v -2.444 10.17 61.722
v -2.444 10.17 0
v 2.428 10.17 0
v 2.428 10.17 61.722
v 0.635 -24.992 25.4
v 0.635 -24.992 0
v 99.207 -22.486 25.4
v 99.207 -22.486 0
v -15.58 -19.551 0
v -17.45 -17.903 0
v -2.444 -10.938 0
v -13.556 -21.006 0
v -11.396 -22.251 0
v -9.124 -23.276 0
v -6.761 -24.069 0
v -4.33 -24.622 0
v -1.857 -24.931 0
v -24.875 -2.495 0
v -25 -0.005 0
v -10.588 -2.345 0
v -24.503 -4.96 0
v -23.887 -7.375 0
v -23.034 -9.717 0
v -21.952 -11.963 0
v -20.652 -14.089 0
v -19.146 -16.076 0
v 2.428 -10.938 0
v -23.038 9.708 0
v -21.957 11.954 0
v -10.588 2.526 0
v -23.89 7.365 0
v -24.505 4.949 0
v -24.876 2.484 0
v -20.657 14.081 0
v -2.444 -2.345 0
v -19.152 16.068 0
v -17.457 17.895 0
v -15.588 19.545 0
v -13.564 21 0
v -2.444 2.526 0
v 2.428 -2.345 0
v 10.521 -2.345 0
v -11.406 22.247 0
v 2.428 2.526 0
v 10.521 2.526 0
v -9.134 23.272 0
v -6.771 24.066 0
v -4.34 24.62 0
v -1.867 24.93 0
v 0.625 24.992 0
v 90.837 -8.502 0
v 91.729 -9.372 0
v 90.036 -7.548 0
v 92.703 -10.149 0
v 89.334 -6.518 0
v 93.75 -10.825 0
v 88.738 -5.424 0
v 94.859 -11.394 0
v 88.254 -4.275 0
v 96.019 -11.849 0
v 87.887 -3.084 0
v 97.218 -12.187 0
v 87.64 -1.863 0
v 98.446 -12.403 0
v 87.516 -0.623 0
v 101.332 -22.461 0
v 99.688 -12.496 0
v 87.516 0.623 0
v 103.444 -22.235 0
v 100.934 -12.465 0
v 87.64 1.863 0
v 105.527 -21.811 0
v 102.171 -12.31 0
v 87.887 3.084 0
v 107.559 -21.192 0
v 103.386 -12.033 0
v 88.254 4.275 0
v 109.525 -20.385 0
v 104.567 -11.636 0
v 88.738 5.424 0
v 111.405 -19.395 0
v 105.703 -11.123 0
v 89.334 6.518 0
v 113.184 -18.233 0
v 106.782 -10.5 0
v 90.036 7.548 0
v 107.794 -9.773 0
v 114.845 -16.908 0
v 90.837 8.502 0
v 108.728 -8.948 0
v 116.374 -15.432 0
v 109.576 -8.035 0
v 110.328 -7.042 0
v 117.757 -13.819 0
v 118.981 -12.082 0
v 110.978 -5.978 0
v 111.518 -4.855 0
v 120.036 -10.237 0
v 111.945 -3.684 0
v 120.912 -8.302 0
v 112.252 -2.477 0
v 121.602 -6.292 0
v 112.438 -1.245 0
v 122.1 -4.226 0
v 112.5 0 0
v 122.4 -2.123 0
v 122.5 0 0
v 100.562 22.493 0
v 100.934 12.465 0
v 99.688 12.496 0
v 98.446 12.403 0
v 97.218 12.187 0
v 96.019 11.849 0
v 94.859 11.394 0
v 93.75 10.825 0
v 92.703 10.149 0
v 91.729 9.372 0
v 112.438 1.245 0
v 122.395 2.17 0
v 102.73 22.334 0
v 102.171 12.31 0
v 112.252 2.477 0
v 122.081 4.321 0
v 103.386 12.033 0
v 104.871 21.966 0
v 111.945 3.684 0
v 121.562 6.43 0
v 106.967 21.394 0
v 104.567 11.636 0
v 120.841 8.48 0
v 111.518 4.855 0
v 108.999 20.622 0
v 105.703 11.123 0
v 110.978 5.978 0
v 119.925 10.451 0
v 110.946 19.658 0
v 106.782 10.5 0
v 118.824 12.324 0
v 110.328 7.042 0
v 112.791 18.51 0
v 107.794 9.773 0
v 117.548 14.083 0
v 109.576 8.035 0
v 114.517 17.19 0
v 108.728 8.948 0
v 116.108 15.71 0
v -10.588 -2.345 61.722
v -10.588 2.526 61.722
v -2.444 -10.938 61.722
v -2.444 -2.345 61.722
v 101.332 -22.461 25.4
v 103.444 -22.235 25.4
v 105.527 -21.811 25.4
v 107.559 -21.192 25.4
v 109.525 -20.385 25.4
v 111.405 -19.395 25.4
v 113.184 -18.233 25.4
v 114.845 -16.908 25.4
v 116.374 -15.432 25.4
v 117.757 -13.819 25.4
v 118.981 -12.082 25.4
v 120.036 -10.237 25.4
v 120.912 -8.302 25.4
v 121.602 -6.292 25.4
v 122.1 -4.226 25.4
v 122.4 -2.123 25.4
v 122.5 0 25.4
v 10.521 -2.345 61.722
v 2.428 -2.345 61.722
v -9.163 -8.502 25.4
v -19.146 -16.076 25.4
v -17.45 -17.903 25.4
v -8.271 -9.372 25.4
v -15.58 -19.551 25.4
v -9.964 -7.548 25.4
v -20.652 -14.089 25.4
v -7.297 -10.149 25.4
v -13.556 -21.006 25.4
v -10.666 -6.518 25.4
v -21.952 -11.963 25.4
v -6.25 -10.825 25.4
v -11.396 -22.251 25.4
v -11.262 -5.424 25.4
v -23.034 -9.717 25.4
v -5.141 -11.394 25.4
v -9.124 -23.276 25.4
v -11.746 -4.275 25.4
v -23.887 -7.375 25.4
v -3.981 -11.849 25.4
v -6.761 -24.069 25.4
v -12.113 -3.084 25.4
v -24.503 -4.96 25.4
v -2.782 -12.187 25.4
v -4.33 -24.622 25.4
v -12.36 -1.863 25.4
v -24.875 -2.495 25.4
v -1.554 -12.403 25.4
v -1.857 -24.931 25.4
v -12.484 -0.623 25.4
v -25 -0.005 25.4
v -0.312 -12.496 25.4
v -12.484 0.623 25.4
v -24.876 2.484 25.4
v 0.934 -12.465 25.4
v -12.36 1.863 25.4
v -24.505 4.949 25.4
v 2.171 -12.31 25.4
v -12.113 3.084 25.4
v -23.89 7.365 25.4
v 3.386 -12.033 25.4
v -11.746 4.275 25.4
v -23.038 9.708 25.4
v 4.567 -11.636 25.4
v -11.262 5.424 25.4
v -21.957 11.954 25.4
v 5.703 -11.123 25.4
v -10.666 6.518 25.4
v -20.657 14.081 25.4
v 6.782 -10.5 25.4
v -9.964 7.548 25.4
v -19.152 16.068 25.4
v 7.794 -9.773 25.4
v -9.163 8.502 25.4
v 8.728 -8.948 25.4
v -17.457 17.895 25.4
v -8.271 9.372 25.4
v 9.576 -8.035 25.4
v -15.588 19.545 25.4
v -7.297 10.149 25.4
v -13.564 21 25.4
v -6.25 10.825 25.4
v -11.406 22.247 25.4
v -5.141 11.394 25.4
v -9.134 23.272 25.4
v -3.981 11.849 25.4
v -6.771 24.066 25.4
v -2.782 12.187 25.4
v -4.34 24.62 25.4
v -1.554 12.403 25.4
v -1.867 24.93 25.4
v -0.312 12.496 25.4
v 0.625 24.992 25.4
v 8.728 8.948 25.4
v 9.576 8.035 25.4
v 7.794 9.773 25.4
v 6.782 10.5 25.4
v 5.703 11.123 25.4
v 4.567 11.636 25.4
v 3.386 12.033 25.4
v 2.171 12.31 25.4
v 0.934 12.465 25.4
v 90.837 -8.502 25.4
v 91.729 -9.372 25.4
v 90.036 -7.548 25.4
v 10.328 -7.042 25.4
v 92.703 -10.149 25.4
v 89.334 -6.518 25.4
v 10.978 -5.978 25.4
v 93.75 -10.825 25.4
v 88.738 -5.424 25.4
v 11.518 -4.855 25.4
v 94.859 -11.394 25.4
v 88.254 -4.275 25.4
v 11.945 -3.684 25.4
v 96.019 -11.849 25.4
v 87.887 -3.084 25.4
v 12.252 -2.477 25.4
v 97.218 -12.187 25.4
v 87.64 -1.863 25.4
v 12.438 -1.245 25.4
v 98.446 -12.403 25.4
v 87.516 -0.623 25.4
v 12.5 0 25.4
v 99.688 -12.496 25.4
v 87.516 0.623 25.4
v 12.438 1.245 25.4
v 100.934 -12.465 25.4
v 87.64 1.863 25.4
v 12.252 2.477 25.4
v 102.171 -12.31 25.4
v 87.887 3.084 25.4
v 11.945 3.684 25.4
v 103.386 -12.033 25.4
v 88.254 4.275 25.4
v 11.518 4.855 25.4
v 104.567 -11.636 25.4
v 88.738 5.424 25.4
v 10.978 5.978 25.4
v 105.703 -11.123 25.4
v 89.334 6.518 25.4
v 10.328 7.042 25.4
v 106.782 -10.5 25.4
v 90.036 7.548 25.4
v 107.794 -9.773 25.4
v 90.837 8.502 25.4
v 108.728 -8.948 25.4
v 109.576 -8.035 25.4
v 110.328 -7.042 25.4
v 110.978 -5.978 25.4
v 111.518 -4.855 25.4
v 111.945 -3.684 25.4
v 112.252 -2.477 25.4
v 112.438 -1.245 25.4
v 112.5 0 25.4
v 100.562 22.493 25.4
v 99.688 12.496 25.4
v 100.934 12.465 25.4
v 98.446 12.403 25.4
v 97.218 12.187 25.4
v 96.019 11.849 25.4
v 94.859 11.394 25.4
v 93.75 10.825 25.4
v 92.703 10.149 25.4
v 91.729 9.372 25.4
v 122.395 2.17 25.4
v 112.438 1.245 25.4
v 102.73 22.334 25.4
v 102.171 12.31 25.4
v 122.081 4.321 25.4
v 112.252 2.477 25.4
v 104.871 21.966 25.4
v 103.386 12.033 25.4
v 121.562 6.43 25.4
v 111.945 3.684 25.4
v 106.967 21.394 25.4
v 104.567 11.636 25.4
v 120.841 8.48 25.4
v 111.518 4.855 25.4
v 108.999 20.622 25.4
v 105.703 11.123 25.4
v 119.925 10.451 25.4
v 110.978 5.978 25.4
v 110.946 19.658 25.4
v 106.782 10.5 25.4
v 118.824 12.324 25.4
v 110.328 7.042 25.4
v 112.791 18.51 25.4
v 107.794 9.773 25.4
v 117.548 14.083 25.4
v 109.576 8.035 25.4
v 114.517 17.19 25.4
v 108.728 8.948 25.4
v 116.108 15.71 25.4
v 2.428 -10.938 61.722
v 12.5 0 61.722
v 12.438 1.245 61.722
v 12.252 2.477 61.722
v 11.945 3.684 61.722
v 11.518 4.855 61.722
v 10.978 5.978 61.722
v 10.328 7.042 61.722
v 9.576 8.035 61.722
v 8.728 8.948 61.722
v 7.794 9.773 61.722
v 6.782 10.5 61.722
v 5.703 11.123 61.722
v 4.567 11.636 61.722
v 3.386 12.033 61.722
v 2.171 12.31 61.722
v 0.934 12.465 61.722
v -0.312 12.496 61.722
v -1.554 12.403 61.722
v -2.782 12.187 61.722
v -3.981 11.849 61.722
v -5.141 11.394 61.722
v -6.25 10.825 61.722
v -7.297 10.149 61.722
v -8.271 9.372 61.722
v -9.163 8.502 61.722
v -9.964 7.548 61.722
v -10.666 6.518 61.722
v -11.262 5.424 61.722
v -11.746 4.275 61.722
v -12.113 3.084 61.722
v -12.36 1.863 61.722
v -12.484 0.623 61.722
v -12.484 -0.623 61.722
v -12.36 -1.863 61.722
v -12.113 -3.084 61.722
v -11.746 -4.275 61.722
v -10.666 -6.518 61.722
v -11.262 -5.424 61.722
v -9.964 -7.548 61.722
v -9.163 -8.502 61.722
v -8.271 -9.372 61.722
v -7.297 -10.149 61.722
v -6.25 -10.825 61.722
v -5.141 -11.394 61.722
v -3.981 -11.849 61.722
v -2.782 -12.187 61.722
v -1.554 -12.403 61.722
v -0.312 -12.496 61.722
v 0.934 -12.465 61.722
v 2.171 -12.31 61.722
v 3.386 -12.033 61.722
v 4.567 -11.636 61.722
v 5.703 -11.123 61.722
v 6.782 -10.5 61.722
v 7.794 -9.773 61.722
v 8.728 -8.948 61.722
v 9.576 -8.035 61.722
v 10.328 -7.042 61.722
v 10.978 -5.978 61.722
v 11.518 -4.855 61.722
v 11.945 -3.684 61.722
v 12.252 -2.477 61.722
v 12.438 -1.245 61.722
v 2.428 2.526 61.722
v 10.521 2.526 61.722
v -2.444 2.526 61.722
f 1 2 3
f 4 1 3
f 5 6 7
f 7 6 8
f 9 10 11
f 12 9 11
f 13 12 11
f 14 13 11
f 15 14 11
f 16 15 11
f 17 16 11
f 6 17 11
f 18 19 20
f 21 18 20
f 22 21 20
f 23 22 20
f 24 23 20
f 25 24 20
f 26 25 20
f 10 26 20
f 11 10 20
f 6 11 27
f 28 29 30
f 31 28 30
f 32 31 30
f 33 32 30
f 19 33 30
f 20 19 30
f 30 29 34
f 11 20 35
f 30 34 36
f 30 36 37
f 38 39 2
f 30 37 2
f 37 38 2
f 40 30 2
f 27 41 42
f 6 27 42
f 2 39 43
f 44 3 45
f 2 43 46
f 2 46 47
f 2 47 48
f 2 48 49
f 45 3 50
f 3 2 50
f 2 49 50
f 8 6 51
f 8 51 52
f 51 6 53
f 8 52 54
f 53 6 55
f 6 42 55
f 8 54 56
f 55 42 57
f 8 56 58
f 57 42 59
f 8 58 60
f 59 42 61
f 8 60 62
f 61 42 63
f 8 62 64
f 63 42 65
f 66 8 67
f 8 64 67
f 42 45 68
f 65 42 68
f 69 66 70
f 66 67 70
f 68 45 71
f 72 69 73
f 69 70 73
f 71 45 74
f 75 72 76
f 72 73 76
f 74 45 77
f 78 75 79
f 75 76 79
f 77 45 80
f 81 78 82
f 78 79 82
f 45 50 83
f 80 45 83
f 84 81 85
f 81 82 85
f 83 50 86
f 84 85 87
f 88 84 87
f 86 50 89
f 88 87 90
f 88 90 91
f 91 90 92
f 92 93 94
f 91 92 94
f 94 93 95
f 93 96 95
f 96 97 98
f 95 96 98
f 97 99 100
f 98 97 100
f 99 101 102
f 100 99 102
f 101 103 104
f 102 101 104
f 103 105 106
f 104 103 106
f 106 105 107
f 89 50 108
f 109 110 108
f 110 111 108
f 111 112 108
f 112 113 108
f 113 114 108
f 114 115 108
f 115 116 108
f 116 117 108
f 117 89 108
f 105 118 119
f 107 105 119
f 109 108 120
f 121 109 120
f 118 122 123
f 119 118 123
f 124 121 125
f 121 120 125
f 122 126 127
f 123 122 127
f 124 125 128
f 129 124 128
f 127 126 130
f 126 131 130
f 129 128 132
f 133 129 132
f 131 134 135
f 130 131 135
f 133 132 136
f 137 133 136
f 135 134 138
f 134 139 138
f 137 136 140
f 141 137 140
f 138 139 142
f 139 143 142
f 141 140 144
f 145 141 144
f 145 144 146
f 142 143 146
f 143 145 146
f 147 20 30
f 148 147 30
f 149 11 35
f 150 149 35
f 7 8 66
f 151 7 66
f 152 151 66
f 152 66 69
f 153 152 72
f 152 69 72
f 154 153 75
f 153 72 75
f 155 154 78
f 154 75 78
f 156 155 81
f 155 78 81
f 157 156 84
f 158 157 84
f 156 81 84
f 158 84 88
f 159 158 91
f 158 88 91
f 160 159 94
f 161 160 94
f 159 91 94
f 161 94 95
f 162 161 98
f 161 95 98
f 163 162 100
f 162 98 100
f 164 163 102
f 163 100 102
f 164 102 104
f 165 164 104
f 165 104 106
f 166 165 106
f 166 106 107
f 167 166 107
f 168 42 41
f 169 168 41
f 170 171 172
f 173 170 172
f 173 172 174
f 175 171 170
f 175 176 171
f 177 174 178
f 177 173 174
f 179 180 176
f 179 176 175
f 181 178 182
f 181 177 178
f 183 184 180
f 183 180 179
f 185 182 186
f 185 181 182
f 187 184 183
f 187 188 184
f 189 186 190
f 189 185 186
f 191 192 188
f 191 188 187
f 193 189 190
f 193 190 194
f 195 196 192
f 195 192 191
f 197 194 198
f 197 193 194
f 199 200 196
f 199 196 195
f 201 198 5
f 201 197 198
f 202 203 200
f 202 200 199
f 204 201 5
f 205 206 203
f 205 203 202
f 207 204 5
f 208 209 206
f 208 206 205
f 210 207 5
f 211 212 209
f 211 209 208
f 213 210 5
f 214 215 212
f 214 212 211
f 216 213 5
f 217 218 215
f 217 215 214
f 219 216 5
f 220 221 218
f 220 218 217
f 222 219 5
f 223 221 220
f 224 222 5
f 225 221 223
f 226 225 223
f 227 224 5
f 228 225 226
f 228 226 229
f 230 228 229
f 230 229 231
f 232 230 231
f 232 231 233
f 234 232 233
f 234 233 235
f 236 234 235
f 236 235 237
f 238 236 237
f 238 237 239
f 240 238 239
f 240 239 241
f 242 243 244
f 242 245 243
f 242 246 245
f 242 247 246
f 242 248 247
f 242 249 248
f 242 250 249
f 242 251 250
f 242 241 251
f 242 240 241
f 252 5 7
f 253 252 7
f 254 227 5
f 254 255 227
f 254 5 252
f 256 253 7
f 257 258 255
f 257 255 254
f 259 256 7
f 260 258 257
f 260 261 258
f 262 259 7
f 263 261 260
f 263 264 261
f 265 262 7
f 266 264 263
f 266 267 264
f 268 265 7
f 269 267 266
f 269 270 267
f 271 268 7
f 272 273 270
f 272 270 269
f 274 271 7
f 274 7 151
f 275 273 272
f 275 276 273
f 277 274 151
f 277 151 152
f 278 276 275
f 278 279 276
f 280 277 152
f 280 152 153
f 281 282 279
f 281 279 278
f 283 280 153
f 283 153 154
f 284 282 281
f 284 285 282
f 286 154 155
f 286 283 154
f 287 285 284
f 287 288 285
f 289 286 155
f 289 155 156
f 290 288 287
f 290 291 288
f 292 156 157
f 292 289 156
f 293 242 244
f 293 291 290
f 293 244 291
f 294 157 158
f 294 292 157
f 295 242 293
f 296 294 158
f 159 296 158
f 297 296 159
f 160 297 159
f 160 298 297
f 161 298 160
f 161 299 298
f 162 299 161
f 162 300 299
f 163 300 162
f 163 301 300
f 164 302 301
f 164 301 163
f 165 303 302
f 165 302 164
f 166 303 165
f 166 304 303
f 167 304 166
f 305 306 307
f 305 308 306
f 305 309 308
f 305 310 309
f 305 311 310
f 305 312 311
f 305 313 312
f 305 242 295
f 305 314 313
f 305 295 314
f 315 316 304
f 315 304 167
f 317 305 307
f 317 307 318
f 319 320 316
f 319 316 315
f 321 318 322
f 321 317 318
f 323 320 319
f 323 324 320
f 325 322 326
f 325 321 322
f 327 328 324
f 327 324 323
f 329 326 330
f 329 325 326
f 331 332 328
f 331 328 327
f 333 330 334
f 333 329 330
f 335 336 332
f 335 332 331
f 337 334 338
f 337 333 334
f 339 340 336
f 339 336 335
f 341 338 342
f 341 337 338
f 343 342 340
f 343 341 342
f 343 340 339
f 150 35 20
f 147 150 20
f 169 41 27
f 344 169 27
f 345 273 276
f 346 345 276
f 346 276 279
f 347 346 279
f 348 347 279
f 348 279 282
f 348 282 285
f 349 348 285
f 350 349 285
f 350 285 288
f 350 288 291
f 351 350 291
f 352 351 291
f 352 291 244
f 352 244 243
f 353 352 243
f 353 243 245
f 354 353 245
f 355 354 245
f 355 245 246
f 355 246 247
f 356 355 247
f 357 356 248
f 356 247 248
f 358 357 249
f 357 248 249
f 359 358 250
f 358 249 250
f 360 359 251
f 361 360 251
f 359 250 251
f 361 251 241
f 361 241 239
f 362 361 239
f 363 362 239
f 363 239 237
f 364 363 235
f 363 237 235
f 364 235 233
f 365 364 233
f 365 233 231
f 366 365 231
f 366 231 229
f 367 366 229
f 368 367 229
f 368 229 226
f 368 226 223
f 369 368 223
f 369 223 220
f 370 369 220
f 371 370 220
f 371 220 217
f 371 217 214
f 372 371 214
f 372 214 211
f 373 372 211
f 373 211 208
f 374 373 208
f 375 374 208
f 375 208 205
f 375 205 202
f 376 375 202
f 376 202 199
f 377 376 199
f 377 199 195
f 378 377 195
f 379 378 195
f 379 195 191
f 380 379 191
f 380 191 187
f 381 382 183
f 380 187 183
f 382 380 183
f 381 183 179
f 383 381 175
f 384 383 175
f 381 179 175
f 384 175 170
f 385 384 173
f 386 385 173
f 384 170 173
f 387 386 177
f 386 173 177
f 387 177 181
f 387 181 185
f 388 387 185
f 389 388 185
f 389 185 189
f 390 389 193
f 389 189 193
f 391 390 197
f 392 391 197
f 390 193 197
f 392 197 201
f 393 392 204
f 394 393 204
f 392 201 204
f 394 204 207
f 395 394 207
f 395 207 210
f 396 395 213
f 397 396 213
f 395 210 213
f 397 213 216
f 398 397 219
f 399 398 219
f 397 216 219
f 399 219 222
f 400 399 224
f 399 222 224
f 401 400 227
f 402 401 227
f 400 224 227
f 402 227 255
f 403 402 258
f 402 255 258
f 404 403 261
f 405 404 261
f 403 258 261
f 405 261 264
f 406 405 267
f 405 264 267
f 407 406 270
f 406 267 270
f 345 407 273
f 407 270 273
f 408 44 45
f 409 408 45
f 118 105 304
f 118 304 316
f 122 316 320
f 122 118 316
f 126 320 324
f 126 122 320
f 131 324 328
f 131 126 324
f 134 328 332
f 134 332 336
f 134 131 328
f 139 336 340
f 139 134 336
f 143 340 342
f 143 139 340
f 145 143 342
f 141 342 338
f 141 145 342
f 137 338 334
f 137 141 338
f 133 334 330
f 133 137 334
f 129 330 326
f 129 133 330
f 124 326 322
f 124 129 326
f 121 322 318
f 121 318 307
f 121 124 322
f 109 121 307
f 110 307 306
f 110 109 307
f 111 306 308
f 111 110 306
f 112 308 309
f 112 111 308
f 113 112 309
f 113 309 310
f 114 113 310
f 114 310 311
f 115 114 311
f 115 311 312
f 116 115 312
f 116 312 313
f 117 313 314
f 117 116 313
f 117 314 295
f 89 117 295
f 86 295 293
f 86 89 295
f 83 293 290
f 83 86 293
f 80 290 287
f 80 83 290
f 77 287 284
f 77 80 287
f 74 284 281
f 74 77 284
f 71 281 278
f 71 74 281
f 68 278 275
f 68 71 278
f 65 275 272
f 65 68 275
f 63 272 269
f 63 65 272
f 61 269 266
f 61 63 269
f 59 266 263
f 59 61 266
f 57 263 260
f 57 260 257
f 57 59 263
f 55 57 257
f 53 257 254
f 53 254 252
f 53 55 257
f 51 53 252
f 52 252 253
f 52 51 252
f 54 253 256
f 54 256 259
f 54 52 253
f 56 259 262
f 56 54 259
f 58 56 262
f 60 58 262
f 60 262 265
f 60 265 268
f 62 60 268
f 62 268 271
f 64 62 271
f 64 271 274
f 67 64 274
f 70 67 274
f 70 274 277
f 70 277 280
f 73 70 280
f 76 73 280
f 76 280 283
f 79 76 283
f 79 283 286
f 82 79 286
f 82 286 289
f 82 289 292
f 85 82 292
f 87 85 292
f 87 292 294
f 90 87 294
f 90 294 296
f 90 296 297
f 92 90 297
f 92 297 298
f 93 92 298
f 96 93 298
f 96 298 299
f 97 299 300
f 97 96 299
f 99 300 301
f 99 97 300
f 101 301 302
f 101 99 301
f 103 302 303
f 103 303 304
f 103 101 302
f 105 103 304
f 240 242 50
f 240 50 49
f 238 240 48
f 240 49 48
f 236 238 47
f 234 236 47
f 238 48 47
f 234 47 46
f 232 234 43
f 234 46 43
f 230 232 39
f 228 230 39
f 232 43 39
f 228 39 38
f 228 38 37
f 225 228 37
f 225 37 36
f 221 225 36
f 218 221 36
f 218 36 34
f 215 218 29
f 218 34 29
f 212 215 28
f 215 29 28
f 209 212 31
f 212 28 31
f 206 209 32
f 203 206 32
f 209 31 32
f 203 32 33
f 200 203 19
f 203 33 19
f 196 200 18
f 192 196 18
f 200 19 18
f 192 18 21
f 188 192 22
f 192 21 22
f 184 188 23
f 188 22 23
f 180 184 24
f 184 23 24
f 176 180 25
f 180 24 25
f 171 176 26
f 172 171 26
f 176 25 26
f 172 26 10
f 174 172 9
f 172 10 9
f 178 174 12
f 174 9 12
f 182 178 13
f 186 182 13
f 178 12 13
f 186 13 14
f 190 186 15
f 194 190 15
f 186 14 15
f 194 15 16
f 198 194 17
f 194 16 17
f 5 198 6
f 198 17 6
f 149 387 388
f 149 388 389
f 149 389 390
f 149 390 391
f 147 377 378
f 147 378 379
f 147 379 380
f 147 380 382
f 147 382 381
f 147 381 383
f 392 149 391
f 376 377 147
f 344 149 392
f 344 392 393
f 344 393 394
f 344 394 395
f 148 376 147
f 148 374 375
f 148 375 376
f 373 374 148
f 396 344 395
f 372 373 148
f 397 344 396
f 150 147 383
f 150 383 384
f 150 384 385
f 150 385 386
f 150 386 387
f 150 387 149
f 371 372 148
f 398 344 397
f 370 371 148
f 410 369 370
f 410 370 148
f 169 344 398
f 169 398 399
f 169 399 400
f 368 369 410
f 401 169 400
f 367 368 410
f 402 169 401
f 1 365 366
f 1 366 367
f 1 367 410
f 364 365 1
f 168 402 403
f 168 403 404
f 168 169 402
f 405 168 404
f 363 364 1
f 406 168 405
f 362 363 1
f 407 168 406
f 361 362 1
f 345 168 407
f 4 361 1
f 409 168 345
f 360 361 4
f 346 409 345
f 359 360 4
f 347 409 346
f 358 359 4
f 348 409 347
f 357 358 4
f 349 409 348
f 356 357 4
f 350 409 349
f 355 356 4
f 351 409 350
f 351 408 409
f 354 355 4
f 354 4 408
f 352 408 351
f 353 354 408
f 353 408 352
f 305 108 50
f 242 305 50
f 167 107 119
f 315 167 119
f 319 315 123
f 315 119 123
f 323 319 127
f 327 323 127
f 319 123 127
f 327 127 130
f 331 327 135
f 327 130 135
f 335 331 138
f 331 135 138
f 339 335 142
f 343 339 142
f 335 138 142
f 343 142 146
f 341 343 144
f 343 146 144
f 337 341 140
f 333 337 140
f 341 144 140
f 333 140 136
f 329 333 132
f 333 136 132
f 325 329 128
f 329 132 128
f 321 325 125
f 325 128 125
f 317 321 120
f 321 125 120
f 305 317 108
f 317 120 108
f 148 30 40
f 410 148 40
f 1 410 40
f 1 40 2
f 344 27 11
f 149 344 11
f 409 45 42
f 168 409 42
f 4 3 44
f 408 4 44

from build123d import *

# Parameters (mm, degrees)
F0_R     = 12.5
F1_DEPTH = 25.4
F2_DEPTH = 61.722


with BuildPart() as f1:
    # F0 (on Top) → F1 (new body)
    with BuildSketch(Plane.XY):
        with BuildLine():
            ThreePointArc((0.635351, -24.991925), (17.900891, -17.451593), (25, 0))
            ThreePointArc((25, 0), (17.897276, 17.4553), (0.625, 24.992186))
            ThreePointArc((0.625, 24.992186), (-24.999999, -0.005177), (0.635351, -24.991925))
        make_face()
        Circle(F0_R, mode=Mode.SUBTRACT)
        with BuildLine():
            ThreePointArc((0.625, 24.992186), (17.897276, 17.4553), (25, 0))
            ThreePointArc((25, 0), (17.900891, -17.451593), (0.635351, -24.991925))
            Line((0.635351, -24.991925), (99.206847, -22.486016))
            ThreePointArc((99.206847, -22.486016), (77.510213, 0.677835), (100.5625, 22.492968))
            Line((100.5625, 22.492968), (0.625, 24.992186))
        make_face()
        with BuildLine():
            ThreePointArc((122.5, 0), (116.107549, 15.70977), (100.5625, 22.492968))
            ThreePointArc((100.5625, 22.492968), (77.510213, 0.677835), (99.206847, -22.486016))
            ThreePointArc((99.206847, -22.486016), (115.626965, -16.187896), (122.5, 0))
        make_face()
        with Locations((100, 0)):
            Circle(F0_R, mode=Mode.SUBTRACT)
    extrude(amount=F1_DEPTH)

    # F0 (on Top) → F2 (join)
    with BuildSketch(Plane.XY):
        Circle(F0_R)
        Polygon((-2.443647, 2.525975), (-2.443647, 10.170371), (2.427822, 10.170371), (2.427822, 2.525975), (10.520946, 2.525975), (10.520946, -2.345494), (2.427822, -2.345494), (2.427822, -10.938356), (-2.443647, -10.938356), (-2.443647, -2.345494), (-10.587781, -2.345494), (-10.587781, 2.525975), align=None, mode=Mode.SUBTRACT)
    extrude(amount=F2_DEPTH)


solid = f1.part
